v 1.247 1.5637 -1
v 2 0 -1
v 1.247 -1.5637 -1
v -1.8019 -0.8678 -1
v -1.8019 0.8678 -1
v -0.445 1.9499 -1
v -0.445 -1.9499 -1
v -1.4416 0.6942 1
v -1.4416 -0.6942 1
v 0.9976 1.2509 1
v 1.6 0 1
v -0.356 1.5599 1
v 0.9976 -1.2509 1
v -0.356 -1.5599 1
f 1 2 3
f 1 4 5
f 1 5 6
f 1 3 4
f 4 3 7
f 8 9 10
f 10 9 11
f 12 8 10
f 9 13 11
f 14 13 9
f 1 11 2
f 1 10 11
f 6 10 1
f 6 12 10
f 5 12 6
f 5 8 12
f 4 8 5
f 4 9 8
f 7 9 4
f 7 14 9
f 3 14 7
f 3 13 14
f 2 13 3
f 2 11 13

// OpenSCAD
module countersink(base_radius = 2, top_radius = 1.6, height = 2) {
    scale_ration = top_radius / base_radius;
    linear_extrude(height,center=true, scale=scale_ration) {
        circle(base_radius);
    }
}

countersink();
